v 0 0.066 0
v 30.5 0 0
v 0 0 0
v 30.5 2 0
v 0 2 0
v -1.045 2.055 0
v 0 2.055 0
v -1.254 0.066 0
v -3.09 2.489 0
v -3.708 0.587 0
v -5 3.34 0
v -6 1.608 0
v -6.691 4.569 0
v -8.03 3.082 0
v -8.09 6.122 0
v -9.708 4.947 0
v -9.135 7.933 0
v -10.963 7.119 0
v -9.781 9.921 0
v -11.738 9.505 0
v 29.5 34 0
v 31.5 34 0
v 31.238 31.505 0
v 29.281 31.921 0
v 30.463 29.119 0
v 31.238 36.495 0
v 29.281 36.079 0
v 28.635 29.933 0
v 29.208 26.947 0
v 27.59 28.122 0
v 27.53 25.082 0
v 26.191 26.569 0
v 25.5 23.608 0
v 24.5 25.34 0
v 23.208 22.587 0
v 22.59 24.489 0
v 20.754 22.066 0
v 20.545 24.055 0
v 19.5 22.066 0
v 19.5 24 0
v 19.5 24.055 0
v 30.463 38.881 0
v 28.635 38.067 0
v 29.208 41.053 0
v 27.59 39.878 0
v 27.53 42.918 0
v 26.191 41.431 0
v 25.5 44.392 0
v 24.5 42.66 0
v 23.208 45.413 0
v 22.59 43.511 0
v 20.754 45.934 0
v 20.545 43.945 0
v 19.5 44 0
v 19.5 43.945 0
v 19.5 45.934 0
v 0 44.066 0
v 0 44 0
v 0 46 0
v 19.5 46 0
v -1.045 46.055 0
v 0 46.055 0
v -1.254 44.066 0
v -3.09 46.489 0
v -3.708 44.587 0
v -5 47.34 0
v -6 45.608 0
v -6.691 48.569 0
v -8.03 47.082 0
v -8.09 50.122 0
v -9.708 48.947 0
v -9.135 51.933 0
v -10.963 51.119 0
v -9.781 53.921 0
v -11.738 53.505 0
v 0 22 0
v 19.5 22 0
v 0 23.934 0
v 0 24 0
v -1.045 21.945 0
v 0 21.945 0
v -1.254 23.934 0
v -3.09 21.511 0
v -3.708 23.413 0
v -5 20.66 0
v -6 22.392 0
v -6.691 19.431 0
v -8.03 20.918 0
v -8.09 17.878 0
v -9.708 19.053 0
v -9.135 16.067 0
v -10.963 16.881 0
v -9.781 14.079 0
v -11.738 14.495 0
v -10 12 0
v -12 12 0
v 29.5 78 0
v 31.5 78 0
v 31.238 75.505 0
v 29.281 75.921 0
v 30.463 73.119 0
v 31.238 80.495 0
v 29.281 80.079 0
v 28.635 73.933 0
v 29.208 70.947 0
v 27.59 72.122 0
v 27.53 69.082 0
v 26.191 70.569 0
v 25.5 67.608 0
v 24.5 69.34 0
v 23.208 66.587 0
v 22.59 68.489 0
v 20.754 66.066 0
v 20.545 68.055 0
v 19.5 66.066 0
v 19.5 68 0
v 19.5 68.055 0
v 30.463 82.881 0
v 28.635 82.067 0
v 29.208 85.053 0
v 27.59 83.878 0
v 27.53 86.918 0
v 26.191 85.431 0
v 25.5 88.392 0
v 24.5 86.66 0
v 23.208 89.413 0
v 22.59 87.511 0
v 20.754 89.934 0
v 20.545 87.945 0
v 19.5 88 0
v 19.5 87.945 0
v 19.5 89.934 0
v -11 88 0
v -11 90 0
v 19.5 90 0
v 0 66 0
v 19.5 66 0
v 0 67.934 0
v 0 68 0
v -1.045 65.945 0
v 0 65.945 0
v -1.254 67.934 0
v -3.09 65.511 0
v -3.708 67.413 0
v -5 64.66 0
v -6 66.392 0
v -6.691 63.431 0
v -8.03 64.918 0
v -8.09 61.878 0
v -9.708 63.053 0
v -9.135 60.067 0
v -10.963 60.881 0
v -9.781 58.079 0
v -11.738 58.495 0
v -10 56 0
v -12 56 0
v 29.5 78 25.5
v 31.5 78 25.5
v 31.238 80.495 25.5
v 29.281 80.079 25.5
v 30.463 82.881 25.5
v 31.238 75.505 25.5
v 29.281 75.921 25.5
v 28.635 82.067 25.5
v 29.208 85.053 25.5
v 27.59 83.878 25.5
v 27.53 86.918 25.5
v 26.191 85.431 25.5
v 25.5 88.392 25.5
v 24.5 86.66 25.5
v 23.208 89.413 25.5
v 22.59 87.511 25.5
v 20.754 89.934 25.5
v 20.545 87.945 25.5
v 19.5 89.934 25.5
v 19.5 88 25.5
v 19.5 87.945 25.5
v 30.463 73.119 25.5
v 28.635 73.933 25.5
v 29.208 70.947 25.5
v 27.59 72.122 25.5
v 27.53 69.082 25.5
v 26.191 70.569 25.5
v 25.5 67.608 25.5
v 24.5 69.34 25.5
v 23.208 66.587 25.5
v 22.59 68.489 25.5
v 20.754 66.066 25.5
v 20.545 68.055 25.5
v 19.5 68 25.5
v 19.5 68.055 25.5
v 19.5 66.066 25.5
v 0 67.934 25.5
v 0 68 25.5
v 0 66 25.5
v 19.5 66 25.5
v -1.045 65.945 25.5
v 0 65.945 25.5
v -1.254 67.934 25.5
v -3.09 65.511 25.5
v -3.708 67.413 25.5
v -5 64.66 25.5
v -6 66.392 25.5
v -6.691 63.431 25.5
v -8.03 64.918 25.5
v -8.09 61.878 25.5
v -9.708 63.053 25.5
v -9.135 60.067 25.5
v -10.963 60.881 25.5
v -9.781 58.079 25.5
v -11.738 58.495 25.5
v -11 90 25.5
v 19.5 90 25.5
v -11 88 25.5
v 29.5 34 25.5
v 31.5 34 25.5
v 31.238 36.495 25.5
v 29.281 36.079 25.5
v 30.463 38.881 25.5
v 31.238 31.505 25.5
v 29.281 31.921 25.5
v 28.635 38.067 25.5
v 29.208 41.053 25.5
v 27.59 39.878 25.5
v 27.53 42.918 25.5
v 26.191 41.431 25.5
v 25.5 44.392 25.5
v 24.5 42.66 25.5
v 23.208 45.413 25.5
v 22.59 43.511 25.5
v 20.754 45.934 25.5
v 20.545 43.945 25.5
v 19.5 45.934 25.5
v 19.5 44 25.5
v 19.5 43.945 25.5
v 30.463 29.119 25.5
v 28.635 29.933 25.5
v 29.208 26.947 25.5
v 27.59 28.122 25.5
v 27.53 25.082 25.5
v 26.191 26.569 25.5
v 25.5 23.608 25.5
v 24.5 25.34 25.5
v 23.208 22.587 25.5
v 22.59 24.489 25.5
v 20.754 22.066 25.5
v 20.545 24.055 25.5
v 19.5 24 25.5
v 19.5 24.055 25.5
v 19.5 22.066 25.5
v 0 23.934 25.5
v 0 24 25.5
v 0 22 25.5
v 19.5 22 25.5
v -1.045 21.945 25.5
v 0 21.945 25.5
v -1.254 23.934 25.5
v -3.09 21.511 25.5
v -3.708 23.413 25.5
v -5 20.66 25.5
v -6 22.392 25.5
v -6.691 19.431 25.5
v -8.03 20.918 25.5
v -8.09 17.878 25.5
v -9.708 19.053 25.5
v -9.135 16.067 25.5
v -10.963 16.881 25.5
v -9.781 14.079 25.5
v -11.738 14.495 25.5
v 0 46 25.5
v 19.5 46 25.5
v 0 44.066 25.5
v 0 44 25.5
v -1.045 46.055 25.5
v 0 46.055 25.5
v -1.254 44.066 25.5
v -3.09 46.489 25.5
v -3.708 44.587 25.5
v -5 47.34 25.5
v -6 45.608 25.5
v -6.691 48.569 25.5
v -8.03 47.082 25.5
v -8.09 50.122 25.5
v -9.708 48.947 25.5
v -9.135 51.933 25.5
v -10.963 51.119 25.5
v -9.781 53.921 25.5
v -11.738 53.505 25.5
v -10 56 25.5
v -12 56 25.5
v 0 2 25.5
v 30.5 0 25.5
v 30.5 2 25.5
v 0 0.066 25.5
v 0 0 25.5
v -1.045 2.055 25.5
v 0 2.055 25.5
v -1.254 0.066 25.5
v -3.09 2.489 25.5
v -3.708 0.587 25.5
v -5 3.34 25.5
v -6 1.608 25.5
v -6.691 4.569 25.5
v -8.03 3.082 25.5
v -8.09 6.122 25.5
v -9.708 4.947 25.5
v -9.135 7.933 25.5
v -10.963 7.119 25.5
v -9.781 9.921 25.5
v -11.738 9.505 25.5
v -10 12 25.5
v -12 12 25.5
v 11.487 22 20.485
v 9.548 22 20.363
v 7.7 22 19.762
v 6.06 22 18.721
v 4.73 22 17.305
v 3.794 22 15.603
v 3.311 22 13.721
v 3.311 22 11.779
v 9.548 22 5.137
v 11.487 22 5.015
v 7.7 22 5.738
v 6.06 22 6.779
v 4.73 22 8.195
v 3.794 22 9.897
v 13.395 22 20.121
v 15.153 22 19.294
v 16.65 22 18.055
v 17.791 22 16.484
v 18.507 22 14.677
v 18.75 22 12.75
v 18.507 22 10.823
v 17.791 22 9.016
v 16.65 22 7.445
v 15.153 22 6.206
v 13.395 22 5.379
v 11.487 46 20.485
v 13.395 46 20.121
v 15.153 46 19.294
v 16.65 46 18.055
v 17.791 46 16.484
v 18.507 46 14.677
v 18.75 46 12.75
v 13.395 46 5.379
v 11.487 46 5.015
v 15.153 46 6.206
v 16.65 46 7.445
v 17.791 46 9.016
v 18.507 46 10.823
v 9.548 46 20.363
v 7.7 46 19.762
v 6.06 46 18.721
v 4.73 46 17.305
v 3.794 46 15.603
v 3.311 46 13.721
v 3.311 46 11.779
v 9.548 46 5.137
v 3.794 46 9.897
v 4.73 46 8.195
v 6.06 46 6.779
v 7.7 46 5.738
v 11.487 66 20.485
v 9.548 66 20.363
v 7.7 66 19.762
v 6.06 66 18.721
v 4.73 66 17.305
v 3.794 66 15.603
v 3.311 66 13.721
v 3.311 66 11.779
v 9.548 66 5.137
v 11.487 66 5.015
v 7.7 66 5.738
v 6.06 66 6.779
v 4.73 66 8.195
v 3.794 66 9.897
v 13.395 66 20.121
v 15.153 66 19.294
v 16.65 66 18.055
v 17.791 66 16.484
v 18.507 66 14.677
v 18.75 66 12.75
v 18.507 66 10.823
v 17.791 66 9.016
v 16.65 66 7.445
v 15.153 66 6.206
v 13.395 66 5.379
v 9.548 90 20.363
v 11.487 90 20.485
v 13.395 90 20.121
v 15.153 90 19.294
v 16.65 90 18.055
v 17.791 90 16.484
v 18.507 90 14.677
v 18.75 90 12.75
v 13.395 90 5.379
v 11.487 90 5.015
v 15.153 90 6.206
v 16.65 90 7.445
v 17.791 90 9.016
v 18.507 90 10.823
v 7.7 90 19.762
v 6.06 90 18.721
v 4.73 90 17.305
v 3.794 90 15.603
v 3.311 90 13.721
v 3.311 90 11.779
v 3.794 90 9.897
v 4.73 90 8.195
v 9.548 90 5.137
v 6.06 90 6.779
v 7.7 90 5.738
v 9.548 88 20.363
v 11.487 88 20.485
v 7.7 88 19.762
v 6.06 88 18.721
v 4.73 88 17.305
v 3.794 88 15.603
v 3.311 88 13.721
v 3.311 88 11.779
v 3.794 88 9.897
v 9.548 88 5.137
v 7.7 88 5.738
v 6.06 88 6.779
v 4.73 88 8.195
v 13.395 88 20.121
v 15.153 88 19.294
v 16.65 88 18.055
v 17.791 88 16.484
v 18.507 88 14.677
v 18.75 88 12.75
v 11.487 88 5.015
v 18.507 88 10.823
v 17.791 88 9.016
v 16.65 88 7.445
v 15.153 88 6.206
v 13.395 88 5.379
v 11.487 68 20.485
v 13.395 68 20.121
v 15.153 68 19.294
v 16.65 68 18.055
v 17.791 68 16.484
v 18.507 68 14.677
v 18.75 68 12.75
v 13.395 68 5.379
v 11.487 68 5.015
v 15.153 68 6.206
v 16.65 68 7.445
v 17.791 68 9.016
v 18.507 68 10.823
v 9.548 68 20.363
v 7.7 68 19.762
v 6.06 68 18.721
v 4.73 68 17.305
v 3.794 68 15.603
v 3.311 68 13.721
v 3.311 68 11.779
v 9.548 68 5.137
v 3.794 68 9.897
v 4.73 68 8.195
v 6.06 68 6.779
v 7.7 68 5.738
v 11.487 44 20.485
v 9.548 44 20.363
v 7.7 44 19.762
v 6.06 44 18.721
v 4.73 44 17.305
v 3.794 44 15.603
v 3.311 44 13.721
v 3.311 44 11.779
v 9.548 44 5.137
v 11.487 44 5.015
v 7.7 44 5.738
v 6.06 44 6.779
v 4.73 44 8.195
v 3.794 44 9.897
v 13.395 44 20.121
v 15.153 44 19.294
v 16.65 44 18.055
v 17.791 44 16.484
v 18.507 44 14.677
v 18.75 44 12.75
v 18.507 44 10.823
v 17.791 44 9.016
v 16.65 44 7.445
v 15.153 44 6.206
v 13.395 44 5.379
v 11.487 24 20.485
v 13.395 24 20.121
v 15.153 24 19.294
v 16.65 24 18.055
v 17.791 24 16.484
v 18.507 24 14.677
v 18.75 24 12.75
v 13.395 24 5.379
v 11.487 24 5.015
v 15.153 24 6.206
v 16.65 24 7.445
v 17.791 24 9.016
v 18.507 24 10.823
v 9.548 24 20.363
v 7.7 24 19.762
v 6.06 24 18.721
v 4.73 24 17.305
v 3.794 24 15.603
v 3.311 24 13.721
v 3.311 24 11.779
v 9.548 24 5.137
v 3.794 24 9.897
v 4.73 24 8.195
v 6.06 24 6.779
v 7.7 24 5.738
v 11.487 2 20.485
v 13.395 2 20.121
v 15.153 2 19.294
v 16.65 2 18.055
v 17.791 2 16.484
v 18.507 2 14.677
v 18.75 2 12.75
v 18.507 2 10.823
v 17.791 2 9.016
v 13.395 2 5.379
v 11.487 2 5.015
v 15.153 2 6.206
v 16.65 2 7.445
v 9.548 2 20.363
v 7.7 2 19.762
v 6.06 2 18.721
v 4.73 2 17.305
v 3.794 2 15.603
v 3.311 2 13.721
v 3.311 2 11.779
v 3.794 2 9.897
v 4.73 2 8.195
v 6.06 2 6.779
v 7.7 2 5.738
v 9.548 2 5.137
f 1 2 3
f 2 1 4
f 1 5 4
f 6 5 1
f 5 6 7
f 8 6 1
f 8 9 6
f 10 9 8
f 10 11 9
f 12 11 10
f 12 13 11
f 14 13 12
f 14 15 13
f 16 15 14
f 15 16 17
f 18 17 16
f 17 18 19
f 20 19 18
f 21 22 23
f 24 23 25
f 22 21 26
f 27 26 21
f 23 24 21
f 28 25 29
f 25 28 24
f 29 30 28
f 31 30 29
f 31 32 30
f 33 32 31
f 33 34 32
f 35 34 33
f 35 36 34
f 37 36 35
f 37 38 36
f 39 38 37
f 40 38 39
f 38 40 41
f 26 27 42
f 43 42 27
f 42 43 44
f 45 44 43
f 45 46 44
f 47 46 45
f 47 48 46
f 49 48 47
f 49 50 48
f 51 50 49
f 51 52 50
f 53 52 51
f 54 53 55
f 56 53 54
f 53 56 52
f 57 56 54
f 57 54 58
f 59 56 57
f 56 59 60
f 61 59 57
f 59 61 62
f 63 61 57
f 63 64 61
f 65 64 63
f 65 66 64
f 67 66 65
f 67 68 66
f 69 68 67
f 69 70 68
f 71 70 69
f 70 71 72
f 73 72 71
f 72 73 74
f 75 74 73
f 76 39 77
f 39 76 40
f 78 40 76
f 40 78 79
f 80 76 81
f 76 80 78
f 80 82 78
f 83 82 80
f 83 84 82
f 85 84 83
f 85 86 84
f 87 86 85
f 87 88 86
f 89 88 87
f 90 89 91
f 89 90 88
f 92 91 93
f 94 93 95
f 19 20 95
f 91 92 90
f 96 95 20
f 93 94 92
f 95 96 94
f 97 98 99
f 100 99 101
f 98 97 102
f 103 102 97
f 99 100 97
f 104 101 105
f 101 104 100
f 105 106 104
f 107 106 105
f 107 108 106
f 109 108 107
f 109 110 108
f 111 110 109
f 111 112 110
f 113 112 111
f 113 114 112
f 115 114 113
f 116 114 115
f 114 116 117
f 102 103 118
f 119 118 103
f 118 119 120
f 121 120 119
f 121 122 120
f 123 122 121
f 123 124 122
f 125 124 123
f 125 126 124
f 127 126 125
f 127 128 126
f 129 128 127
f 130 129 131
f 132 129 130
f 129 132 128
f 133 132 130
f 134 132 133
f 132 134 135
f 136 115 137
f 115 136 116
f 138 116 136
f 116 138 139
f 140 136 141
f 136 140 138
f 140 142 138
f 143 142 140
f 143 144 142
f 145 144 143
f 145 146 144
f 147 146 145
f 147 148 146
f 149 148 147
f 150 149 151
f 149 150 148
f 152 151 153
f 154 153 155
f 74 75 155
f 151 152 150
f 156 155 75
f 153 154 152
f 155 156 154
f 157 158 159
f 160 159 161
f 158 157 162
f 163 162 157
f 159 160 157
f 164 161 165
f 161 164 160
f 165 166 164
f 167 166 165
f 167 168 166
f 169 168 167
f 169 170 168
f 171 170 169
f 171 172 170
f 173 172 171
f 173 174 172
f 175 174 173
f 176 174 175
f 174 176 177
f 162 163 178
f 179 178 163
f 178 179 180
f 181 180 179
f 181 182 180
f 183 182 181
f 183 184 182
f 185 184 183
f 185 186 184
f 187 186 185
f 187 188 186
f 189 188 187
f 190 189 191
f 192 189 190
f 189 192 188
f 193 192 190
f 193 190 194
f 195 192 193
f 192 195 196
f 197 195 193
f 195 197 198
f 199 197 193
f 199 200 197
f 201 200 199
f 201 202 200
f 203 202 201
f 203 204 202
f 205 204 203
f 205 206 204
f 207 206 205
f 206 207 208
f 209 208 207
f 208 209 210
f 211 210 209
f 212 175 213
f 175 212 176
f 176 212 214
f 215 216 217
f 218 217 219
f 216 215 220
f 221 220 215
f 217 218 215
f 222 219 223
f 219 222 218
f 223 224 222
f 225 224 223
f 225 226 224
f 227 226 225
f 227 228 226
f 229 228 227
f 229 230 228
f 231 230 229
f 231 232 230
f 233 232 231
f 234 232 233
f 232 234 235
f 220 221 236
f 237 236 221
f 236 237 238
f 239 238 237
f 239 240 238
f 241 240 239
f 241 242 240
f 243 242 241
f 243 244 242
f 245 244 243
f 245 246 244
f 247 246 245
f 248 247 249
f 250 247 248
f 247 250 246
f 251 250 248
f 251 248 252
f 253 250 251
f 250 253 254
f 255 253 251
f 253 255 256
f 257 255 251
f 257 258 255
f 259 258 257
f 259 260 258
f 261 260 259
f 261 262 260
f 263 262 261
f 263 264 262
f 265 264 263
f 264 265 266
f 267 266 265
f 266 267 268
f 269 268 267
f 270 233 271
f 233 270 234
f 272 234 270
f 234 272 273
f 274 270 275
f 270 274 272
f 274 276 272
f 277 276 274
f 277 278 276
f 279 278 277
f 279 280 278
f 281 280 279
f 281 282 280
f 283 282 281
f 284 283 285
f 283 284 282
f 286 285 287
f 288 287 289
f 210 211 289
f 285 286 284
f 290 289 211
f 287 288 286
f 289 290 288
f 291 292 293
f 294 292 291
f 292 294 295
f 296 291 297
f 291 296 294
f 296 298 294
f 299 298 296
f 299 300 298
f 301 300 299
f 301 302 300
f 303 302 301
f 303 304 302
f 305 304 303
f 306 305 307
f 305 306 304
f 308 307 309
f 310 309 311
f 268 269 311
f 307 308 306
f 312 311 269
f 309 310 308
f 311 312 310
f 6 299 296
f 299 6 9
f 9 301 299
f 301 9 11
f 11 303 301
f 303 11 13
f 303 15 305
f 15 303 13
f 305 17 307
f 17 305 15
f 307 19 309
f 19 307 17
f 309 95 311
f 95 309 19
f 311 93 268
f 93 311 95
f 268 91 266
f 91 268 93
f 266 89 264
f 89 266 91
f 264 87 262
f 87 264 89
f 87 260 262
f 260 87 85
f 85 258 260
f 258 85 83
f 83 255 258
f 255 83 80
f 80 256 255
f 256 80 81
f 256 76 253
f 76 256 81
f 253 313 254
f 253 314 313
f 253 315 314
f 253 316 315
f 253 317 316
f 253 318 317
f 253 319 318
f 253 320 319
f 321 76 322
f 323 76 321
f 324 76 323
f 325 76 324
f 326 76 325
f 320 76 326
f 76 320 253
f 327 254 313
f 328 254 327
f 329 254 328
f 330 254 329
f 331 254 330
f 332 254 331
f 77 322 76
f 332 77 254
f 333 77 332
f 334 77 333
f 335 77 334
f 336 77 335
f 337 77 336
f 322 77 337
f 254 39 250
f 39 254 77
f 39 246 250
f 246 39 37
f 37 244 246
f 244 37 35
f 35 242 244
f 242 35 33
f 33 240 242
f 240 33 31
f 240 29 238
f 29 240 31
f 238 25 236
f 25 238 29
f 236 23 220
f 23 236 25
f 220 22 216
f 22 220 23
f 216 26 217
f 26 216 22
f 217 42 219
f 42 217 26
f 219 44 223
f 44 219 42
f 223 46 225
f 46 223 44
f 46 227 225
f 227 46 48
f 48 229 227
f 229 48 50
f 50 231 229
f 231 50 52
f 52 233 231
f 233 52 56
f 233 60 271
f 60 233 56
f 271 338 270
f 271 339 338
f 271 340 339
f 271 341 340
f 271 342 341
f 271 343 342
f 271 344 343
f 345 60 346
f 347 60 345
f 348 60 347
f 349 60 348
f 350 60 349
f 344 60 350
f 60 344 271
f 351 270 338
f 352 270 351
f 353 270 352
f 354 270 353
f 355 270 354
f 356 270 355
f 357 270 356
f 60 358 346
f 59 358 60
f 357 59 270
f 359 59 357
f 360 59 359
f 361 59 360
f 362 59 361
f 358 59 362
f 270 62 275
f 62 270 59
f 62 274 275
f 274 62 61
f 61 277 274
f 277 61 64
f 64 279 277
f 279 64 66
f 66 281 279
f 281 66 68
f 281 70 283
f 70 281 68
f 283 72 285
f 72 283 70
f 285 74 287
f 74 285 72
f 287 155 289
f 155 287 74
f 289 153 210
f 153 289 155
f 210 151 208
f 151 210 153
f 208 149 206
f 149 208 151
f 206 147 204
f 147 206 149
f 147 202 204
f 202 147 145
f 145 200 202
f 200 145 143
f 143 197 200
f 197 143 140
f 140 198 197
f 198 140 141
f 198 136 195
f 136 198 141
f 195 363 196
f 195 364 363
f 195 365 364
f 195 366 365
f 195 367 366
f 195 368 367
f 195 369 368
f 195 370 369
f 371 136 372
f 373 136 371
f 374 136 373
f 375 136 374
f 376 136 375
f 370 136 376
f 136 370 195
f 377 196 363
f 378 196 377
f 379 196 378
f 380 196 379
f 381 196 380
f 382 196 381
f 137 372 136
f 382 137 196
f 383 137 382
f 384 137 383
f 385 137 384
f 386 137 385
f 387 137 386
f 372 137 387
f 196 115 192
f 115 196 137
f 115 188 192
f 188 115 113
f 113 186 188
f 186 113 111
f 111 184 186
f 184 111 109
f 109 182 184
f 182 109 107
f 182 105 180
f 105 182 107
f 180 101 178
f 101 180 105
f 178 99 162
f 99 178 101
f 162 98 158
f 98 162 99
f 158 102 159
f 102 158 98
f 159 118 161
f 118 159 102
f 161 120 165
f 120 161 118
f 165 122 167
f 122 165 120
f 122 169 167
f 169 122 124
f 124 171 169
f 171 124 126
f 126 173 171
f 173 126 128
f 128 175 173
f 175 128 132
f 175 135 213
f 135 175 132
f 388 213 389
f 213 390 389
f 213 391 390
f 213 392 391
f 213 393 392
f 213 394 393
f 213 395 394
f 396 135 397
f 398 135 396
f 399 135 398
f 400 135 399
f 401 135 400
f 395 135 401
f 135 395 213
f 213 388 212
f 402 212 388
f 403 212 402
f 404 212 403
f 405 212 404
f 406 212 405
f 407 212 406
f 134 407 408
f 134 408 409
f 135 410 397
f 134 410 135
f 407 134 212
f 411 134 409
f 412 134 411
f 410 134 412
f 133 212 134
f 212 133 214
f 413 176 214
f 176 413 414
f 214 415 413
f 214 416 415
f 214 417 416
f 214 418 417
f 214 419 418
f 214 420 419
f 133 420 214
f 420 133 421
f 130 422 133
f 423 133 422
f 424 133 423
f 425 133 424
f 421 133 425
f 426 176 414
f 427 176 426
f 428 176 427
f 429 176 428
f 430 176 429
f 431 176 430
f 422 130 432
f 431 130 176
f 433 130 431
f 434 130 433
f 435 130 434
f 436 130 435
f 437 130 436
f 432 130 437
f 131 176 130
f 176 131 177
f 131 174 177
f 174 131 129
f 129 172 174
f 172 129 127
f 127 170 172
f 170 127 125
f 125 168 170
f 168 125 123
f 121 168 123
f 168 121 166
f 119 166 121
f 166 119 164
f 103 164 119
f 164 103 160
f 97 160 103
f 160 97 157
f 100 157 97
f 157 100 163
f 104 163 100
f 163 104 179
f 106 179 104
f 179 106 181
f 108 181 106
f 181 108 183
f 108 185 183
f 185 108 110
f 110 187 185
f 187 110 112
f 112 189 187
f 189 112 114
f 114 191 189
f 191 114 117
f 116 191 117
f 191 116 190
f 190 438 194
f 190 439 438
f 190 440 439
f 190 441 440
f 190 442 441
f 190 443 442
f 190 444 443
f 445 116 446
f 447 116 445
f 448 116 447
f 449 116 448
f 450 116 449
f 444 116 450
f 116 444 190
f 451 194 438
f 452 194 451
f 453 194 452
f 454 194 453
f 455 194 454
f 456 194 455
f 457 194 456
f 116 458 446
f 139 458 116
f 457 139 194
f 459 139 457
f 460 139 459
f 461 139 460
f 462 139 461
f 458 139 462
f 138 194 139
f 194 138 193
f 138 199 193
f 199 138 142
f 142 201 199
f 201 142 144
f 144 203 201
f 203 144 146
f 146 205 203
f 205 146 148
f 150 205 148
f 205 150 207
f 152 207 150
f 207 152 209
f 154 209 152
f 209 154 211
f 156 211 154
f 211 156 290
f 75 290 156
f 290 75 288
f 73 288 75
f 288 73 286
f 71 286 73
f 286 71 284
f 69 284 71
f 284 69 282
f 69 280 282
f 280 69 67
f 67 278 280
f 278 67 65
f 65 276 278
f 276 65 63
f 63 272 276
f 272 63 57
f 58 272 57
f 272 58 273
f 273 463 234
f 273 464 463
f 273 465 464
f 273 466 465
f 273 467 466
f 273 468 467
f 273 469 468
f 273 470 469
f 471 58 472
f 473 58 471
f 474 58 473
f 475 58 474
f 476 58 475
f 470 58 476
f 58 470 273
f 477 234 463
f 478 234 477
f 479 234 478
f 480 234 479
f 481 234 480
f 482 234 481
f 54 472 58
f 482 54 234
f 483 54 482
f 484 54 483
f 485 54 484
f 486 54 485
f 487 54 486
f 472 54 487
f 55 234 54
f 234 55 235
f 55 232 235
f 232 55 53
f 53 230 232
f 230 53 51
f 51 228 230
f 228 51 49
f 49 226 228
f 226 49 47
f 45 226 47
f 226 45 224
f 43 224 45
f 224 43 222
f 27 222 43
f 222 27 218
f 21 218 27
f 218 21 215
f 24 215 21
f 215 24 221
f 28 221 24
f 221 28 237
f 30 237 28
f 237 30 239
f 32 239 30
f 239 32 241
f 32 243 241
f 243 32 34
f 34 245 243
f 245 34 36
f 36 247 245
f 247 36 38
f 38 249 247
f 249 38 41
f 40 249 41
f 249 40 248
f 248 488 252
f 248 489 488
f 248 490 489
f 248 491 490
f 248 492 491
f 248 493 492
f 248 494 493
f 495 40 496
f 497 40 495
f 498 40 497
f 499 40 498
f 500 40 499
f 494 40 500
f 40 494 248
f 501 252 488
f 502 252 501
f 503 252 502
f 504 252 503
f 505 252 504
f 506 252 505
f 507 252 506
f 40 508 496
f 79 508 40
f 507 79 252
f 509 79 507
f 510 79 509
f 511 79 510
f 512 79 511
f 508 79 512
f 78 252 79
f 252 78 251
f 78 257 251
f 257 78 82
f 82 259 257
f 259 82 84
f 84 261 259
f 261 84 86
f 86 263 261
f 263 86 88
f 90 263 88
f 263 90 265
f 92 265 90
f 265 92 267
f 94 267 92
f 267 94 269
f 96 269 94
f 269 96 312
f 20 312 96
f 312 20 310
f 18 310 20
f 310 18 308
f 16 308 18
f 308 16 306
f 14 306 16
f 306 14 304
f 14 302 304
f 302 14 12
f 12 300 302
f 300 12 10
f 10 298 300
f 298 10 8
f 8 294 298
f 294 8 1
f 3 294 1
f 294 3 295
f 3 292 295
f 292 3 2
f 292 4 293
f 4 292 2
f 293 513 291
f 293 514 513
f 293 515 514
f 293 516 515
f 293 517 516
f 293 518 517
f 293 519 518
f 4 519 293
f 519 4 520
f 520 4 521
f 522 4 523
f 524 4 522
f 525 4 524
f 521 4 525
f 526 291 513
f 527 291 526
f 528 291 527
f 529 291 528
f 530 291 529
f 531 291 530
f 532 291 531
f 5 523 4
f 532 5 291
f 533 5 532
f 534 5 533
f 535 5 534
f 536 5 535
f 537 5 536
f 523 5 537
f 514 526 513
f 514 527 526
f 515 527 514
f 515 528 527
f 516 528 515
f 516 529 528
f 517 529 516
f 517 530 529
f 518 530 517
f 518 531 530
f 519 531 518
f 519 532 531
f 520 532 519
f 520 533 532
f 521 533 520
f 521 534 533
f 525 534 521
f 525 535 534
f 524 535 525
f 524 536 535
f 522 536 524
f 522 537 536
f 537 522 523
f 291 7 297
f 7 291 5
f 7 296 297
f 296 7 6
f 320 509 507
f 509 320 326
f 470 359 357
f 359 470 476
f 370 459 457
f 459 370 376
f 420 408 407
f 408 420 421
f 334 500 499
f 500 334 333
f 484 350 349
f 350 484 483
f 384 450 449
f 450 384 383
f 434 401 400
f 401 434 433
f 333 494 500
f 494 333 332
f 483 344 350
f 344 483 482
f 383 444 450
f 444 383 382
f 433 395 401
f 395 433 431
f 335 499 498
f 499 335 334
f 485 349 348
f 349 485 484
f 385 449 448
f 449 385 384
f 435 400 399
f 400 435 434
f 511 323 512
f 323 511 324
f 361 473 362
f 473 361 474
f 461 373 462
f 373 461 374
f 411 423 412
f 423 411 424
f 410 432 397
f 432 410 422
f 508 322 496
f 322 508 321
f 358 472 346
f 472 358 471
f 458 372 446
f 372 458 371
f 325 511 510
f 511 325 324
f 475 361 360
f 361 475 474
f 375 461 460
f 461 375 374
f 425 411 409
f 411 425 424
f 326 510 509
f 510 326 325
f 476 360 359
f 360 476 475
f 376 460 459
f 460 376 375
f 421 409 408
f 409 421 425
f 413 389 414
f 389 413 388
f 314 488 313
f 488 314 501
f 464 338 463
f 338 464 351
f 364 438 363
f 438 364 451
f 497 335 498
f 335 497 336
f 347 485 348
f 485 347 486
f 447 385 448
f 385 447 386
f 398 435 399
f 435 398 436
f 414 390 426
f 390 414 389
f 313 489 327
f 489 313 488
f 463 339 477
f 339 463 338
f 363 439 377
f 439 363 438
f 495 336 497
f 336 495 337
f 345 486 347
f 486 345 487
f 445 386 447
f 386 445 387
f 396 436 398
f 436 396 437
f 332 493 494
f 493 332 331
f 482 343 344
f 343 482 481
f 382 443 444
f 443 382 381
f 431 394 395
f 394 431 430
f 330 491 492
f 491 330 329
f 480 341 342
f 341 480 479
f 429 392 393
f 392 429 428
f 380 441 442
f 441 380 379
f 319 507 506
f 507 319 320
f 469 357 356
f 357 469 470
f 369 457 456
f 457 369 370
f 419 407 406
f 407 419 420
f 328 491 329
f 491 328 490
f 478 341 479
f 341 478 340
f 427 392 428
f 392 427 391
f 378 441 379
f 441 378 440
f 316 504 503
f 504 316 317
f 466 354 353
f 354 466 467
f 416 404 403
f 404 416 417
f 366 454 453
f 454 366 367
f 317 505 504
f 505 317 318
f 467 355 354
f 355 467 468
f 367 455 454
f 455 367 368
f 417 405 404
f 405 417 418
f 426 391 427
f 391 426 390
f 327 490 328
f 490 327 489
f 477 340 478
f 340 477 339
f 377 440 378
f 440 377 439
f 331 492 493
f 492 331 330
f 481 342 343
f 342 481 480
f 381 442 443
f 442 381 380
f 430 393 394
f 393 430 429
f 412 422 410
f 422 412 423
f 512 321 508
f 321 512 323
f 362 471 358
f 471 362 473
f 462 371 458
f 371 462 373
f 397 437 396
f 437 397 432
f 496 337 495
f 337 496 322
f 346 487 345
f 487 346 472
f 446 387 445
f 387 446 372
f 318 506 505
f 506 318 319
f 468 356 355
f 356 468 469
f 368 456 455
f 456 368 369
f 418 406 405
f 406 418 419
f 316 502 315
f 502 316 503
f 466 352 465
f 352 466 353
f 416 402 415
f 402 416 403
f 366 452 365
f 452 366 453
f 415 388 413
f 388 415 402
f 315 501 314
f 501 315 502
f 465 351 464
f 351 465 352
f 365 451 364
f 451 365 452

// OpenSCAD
/****************************************************/
/* Project name: springTube                         */
/* File: springTubes.scad                           */
/* Version: v1.2                                    */
/* Create by: Rom1 <rom1@canel.ch>                  */
/*            CANEL - https://www.canel.ch          */
/* Date: 01 mai 2017                                */
/* License: GNU GENERAL PUBLIC LICENSE v3           */
/* Programme: openscad                              */
/* Description: Test tube support like spring       */
/****************************************************/


/*************/
/* Variables */
/*************/

thinkness = 2;                              // Thinkness

numbres_tubes = 1;                          // Numbers of test tubes
tube_diameter = 15.5;                       // Diameter of test tube
spring_space = 22;                          // Space between the spring
base_length = 80;                           // Base's length
spring_width = tube_diameter + 2*thinkness; // Spring's length
numbers_coils = 4;                          // Numbers of spring coils
width = spring_width + 6;                   // Width


/***********/
/* Modules */
/***********/

module halfCircle(dia = 20, tn = 2, orient = 0) {
	translate([0, (dia + tn)/2, 0])
	difference(){
		circle(d = dia + tn);
		circle(d = dia - tn);
		rotate([0, 0, orient]) translate([0, -(dia + tn)/2]) square([(spring_space + tn)/2, spring_space + tn]);
	}
}

module halfLoop(orient = "left", end = "no"){
	module piece(){
		halfCircle(spring_space, thinkness);
		translate([0, spring_space]) square([spring_width, thinkness]);
		if(end == "yes"){
			translate([spring_width, spring_space]) square([spring_space/2, thinkness]);
		}
	}
	if(orient == "left") {
		piece();
	}
	if(orient == "right"){
		mirror([1, 0, 0]) piece();
	}
}

module loop(orient = "left", end = "no"){
	module piece(orient = "left"){
		halfLoop();
		translate([spring_width, spring_space]) mirror([1, 0, 0]) halfLoop();
		if(end == "yes"){
			translate([-spring_space/2, 2*spring_space]) square([spring_space/2, thinkness]);
		}
	}
	if(orient == "left"){
		piece();
	}
	if(orient == "right"){
		mirror([1, 0, 0]) piece();
	}
}

module form3d(height){
	linear_extrude(height) {
        if(numbres_tubes > 1){
            square([base_length, thinkness]);    // Base
        }else{
            square([spring_width + spring_space/2, thinkness]);
        }

		if(numbers_coils % 2 == 0){
			if(numbers_coils == 2){
                translate([0, (numbers_coils - 2)*spring_space]) loop("left", end = "yes");
                if(numbres_tubes >=1){
                    translate([base_length, (numbers_coils - 2)*spring_space]) loop("right", end = "yes");
                }
			}else{
				for(i = [0:numbers_coils/2-1]){
                    translate([0, i*2*spring_space]) loop("left");
                    if(numbres_tubes > 1){
                        translate([base_length, i*2*spring_space]) loop("right");
                    }
				}
                translate([0, (numbers_coils - 2)*spring_space]) loop("left", end = "yes");
                if(numbres_tubes > 1){
                    translate([base_length, (numbers_coils - 2)*spring_space]) loop("right", end = "yes");
                }
			}
		}else{
			if(numbers_coils == 1){
                translate([0, (numbers_coils - 1)*spring_space]) halfLoop("left", end = "yes");
                if(numbres_tubes > 1){
                    translate([base_length, (numbers_coils - 1)*spring_space]) halfLoop("right", end = "yes");
                }

			}else{
				for(i = [0:numbers_coils/2-1]){
					translate([0, 2*i*spring_space]) loop("left");
                    if(numbres_tubes > 1){
                        translate([base_length, 2*i*spring_space]) loop("right");
                    }
				}
					translate([0, (numbers_coils - 1)*spring_space]) halfLoop("left", end = "yes");
                    if(numbres_tubes > 1){
                        translate([base_length, (numbers_coils - 1)*spring_space]) halfLoop("right", end = "yes");
                    }
			}
		}
	}
}


/********/
/* Main */
/********/

difference(){
	form3d(width);
	translate([spring_space/2, thinkness, width/2]) rotate([270, 0, 0]) cylinder(d = tube_diameter, h = numbers_coils*spring_space+thinkness);
    if(numbres_tubes > 1){
        translate([base_length - spring_space/2, thinkness, width/2]) rotate([270, 0, 0])
            cylinder(d = tube_diameter, h = numbers_coils*spring_space+thinkness);
    }
}


// vim: ft=openscad tw=100 et ts=4 sw=4
